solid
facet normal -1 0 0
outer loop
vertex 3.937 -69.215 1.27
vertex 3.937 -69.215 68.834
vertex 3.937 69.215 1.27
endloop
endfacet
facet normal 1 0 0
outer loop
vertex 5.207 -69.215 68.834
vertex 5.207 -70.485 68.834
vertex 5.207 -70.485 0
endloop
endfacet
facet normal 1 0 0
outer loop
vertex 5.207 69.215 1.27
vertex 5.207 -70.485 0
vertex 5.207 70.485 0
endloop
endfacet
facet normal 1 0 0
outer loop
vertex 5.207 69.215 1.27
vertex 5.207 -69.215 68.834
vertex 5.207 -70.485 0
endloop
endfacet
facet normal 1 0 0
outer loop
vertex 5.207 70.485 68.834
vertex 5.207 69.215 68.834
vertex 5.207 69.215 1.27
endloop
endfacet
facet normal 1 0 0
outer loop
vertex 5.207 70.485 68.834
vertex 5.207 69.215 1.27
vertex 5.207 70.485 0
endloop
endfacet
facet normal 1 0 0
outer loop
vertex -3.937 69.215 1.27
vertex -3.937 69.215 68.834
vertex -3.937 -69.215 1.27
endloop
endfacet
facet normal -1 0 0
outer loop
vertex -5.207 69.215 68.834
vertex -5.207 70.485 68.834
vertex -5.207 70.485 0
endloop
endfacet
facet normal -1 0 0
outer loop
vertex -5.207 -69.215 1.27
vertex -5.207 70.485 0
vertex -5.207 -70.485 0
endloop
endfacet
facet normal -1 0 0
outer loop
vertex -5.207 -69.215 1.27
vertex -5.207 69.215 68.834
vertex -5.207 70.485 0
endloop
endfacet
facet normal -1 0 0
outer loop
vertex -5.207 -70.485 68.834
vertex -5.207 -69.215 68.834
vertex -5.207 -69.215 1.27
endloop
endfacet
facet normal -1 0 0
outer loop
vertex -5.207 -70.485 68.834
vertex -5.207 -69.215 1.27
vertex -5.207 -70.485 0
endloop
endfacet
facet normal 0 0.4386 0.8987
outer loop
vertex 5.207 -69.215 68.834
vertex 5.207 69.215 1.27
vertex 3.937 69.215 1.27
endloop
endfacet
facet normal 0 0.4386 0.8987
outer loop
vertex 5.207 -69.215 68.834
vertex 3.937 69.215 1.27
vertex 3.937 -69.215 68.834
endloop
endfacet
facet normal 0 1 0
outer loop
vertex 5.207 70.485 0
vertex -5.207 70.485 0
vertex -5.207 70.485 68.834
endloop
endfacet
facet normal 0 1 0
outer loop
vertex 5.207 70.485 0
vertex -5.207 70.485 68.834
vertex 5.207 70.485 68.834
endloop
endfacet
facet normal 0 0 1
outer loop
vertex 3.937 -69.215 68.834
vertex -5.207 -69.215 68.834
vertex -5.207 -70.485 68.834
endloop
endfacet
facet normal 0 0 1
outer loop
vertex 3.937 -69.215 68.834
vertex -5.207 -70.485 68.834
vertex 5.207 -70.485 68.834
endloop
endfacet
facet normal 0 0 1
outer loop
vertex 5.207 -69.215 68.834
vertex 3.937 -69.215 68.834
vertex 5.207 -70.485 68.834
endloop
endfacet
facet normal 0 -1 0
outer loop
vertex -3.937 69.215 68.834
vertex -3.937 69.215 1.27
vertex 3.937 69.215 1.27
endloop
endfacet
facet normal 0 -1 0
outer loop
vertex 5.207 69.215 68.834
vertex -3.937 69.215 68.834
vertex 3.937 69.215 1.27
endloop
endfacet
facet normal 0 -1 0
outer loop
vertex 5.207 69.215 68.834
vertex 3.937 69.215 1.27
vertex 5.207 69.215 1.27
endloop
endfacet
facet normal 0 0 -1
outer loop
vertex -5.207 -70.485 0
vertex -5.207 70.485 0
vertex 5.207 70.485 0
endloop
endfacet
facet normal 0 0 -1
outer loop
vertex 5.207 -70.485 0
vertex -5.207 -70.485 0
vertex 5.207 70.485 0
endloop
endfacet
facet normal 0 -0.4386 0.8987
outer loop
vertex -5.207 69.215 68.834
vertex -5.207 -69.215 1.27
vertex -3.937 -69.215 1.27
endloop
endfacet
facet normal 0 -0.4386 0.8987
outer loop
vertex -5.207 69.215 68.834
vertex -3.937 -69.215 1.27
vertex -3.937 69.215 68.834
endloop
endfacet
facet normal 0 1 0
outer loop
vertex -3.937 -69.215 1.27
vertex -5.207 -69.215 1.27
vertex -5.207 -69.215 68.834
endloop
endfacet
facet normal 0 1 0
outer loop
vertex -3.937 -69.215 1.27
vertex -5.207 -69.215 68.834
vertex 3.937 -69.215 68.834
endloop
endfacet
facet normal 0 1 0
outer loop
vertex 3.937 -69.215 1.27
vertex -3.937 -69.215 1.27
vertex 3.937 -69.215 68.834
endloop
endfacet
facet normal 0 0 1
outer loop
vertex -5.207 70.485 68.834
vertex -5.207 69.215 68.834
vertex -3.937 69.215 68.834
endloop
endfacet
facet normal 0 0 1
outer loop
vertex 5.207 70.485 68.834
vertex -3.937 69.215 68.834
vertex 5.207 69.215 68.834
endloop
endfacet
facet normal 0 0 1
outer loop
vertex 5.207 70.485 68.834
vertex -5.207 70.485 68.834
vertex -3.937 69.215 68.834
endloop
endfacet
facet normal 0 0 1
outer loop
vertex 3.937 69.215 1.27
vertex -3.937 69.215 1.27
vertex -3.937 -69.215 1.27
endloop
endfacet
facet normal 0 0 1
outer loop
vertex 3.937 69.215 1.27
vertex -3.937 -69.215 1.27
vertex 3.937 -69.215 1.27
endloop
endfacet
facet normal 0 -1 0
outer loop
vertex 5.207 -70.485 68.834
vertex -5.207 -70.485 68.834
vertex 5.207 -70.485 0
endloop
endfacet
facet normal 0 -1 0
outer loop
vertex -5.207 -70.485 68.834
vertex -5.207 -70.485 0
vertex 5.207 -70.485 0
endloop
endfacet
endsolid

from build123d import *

# Parameters (mm, degrees)
F0_W     = 10.414
F0_H     = 140.97
F1_DEPTH = 1.27
F2_W     = 10.414
F2_H     = 1.27
F3_DEPTH = 67.564
F4_DEPTH = 67.564
F6_DEPTH = 1.27
F8_DEPTH = 1.27


with BuildPart() as f1:
    # F0 (on Top) → F1 (new body)
    with BuildSketch(Plane.XY):
        Rectangle(F0_W, F0_H)
    extrude(amount=F1_DEPTH)

    # F2 (on face) → F3 (join)
    with BuildSketch(Plane.XY.offset(1.27)):
        with Locations((0, -69.85)):
            Rectangle(F2_W, F2_H)
    extrude(amount=F3_DEPTH)

    # F2 (on face) → F4 (join)
    with BuildSketch(Plane.XY.offset(1.27)):
        with Locations((0, 69.85)):
            Rectangle(F2_W, F2_H)
    extrude(amount=F4_DEPTH)

    # F5 (on face) → F6 (join)
    with BuildSketch(Plane.YZ.offset(5.207)):
        Polygon((69.215, 1.27), (-69.215, 68.834), (-69.215, 1.27), align=None)
    extrude(amount=-F6_DEPTH)

    # F7 (on face) → F8 (join)
    with BuildSketch(Plane(origin=(-5.207, 0, 0), x_dir=(0, -1, 0), z_dir=(-1, 0, 0))):
        Polygon((69.215, 1.27), (-69.215, 68.834), (-69.215, 1.27), align=None)
    extrude(amount=-F8_DEPTH)


solid = f1.part
